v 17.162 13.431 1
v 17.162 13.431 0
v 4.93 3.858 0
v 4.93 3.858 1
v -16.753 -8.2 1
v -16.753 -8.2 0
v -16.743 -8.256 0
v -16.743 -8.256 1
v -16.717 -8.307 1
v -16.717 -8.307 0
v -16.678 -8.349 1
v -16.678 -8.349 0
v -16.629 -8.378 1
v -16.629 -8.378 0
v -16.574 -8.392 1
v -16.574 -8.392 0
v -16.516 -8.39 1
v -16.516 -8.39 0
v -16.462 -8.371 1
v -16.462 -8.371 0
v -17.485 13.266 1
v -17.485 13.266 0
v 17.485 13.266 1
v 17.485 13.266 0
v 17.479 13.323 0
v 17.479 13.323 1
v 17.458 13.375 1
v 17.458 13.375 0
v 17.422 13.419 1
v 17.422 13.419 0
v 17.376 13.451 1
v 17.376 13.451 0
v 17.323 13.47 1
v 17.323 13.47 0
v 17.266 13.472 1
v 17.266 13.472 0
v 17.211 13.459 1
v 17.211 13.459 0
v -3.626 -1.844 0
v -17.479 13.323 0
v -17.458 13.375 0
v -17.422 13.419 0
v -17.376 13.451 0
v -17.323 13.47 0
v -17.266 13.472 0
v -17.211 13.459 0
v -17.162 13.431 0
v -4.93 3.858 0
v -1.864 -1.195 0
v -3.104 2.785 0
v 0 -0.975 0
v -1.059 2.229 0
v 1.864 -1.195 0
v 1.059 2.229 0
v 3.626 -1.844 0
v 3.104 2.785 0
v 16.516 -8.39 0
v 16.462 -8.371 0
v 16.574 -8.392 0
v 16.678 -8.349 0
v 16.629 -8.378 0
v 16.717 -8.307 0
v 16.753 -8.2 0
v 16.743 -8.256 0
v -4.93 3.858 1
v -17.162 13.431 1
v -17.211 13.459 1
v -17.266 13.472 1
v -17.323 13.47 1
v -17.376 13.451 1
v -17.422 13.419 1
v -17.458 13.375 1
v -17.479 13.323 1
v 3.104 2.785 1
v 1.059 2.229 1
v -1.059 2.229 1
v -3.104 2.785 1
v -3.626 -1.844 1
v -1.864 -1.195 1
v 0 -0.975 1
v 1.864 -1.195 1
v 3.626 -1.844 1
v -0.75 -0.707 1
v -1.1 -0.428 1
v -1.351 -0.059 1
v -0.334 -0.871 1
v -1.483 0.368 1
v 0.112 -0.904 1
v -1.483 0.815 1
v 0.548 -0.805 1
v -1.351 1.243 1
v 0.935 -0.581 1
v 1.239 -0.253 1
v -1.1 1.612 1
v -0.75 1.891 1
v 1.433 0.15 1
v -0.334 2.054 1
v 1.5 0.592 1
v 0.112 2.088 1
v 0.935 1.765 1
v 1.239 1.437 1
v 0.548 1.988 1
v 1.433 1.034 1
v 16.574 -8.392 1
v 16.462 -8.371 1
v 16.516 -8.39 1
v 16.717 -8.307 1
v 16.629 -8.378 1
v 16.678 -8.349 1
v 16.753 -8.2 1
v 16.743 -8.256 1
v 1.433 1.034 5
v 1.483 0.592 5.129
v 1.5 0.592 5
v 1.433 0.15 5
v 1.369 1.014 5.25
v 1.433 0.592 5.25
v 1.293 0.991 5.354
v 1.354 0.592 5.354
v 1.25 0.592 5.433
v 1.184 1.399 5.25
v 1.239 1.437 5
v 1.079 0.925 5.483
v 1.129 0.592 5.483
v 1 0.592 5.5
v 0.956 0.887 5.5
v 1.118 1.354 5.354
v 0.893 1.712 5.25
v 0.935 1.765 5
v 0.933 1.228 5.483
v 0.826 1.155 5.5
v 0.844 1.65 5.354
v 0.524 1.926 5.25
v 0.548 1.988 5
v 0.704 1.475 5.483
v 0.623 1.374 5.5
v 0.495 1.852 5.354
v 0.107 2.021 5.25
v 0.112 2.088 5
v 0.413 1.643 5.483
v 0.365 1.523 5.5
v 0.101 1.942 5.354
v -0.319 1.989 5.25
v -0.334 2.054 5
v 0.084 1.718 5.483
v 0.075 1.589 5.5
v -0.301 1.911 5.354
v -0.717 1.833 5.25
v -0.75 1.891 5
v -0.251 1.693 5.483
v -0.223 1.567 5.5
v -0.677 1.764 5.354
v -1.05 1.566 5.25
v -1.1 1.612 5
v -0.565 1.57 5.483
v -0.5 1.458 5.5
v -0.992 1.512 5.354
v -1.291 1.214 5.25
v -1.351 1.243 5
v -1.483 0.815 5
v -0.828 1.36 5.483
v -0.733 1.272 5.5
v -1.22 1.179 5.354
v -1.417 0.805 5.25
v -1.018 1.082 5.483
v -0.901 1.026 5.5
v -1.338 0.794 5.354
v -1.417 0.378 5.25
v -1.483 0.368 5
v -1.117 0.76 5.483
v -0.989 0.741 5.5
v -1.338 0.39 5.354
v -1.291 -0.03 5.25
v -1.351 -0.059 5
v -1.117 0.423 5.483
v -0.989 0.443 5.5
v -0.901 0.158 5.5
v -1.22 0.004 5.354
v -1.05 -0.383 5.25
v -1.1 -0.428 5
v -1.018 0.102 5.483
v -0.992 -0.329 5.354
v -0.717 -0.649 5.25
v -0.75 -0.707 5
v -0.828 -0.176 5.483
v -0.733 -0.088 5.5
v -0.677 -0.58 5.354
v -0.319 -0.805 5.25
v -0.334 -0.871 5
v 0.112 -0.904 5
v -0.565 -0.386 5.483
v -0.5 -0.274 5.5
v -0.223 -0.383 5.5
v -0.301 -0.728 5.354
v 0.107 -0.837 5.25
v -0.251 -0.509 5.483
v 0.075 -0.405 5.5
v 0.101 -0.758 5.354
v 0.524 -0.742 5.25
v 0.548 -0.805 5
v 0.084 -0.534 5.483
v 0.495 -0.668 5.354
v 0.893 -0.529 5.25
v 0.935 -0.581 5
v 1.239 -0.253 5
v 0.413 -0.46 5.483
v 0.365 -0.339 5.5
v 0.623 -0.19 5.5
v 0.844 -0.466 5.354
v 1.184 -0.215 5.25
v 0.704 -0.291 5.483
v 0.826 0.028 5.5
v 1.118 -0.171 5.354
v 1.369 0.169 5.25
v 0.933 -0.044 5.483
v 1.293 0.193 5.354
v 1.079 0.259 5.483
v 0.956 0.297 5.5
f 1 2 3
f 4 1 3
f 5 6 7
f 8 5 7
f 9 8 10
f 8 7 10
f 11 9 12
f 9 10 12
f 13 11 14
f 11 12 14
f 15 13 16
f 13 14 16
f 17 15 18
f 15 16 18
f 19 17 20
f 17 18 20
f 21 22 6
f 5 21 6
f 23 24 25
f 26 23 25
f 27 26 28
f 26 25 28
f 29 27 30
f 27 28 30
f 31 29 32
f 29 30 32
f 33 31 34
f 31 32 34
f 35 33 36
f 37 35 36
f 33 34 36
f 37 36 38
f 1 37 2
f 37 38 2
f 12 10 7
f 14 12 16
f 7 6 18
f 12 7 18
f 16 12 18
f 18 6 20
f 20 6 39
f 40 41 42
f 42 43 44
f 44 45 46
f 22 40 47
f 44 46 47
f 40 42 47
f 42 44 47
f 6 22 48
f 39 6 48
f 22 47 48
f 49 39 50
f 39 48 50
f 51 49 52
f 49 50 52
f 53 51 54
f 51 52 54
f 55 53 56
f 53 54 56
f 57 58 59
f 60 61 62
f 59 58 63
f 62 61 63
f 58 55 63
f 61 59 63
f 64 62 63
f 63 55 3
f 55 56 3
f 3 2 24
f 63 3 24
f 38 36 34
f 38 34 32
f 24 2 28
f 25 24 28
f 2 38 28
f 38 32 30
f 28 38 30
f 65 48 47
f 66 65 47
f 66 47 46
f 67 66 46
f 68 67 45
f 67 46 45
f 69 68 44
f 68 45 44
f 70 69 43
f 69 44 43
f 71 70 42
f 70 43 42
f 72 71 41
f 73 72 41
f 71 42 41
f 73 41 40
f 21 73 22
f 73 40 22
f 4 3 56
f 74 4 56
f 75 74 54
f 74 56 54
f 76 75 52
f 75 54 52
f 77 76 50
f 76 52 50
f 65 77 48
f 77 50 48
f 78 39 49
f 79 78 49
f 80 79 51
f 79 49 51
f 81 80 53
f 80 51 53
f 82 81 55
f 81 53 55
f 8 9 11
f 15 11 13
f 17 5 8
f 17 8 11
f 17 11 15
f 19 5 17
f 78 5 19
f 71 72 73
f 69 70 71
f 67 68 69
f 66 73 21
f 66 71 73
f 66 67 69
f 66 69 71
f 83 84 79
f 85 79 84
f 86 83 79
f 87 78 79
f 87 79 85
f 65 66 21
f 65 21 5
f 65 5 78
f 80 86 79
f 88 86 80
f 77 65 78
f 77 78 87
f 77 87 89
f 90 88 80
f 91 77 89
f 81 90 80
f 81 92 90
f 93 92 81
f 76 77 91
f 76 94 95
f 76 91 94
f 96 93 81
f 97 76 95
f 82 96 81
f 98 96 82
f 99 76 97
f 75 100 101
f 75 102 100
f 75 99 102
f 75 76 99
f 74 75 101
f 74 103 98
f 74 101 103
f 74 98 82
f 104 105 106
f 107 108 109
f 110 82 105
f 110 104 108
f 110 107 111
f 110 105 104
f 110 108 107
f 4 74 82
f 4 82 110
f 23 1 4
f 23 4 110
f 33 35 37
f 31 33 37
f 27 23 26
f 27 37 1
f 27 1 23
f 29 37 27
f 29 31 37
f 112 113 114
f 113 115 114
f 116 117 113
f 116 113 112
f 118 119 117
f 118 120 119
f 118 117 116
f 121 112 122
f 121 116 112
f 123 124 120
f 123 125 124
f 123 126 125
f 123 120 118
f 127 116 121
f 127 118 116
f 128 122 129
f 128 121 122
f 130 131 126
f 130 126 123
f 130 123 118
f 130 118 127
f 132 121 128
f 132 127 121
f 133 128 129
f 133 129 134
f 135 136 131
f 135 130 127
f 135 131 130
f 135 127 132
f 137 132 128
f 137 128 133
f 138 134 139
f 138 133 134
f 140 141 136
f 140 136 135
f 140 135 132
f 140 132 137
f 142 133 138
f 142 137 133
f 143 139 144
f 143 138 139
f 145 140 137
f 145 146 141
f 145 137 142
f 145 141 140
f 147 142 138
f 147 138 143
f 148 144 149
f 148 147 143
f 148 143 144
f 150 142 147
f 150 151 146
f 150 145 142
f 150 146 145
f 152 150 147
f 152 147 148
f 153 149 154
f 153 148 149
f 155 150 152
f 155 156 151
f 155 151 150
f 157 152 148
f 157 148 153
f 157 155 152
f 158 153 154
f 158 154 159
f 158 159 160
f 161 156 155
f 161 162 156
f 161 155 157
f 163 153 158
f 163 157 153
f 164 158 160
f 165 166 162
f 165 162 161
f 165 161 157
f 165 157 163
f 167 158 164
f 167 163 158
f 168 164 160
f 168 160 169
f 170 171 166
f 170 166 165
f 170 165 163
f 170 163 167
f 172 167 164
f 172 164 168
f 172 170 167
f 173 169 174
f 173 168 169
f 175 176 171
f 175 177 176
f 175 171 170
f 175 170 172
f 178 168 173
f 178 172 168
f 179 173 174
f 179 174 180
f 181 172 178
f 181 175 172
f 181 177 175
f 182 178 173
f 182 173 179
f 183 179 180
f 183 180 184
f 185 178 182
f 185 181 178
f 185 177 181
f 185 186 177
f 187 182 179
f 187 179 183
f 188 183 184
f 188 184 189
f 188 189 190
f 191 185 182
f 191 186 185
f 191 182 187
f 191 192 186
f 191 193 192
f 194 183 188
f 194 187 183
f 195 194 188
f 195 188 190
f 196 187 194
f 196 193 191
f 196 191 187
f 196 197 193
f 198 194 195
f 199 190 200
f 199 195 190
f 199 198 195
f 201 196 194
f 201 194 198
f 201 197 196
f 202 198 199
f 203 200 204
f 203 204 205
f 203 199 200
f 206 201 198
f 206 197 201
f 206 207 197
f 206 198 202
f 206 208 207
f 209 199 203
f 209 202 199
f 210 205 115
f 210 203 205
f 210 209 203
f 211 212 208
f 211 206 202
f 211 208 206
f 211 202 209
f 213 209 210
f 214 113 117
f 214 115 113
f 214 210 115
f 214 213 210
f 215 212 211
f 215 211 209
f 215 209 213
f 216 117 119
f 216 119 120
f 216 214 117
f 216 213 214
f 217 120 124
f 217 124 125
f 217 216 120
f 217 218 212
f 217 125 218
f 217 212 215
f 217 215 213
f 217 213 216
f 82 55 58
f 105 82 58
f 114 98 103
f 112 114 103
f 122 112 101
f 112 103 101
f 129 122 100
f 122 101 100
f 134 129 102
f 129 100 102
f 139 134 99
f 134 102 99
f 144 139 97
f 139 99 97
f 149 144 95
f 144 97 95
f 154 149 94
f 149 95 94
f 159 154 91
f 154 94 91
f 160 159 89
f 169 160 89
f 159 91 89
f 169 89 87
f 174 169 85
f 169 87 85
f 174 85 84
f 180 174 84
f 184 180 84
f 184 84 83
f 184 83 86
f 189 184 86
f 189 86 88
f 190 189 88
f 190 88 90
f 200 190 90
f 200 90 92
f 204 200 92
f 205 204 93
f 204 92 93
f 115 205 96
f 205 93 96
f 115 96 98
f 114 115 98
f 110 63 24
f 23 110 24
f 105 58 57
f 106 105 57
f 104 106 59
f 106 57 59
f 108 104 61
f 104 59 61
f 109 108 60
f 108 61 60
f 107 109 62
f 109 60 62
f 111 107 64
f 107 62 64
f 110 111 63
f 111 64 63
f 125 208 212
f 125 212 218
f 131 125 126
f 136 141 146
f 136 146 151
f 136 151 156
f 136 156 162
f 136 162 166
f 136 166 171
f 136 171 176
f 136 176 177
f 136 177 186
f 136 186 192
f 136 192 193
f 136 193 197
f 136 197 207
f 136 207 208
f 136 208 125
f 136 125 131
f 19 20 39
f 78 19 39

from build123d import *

# Parameters (mm, degrees)
F3_DEPTH = 1
F4_R     = 1.5
F5_DEPTH = 4.5
F6_R     = 0.5


with BuildPart() as f3:
    # F2 (on Top) → F3 (new body)
    with BuildSketch(Plane.XY):
        with BuildLine():
            Line((17.1622320903, 13.4306918032), (4.9303248829, 3.8583369368))
            ThreePointArc((4.9303248829, 3.8583369368), (0, 2.1584874548), (-4.9303248829, 3.8583369368))
            Line((-4.9303248829, 3.8583369368), (-17.1622320903, 13.4306918032))
            ThreePointArc((-17.1622320903, 13.4306918032), (-17.376145966, 13.4514618026), (-17.4853738885, 13.2663677724))
            Line((-17.4853738885, 13.2663677724), (-16.7529162453, -8.1999925091))
            ThreePointArc((-16.7529162453, -8.1999925091), (-16.6546778346, -8.3654169511), (-16.4623768157, -8.3714460037))
            Line((-16.4623768157, -8.3714460037), (-3.6262301421, -1.8440101433))
            ThreePointArc((-3.6262301421, -1.8440101433), (0, -0.9749606379), (3.6262301421, -1.8440101433))
            Line((3.6262301421, -1.8440101433), (16.4623768157, -8.3714460037))
            ThreePointArc((16.4623768157, -8.3714460037), (16.6546778346, -8.3654169511), (16.7529162453, -8.1999925091))
            Line((16.7529162453, -8.1999925091), (17.4853738885, 13.2663677724))
            ThreePointArc((17.4853738885, 13.2663677724), (17.376145966, 13.4514618026), (17.1622320903, 13.4306918032))
        make_face()
    extrude(amount=F3_DEPTH)

    # F4 (on face) → F5 (join)
    with BuildSketch(Plane.XY.offset(1)):
        with Locations((0, 0.5917634084)):
            Circle(F4_R)
    extrude(amount=F5_DEPTH)

    # F6
    f6_edges = [f3.edges().sort_by_distance(p)[0] for p in [
        (-1.5, 0.591763, 5.5),
    ]]
    fillet(f6_edges, radius=F6_R)


solid = f3.part
